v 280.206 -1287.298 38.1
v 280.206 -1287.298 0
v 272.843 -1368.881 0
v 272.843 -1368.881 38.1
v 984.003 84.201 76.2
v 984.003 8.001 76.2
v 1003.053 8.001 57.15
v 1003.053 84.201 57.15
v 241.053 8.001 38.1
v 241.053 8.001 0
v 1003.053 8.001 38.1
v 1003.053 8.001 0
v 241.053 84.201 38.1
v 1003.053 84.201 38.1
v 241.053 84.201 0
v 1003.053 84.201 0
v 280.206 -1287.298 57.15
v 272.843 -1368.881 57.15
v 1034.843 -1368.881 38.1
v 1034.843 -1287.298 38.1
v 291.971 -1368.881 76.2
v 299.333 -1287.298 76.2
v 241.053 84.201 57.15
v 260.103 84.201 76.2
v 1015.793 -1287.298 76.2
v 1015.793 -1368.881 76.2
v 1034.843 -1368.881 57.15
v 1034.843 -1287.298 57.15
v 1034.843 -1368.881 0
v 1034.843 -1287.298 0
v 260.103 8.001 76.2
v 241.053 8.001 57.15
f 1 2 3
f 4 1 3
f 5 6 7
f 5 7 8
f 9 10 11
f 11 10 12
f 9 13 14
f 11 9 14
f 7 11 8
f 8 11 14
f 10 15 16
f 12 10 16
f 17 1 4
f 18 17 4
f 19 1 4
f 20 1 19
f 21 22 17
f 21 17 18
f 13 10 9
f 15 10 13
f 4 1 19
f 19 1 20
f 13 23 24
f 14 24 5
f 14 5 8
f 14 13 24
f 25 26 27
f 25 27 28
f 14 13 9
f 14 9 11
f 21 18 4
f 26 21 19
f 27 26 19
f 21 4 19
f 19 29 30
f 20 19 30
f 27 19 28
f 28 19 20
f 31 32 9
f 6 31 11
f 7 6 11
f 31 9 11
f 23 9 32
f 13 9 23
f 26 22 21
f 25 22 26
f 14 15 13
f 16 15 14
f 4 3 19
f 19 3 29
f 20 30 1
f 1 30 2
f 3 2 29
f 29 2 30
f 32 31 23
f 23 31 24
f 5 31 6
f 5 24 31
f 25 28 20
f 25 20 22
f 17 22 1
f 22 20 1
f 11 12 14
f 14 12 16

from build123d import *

# Parameters (mm, degrees)
F0_W      = 762
F0_H      = 76.2
F2_DEPTH  = 38.1
F3_DEPTH  = 38.1
F4_W      = 762
F4_H      = 76.2
F5_DEPTH  = 38.1
F7_DEPTH  = 38.1
F8_SIZE   = 19.05
F8_2_SIZE = 19.05


with BuildPart() as f2:
    # F0 (on Top) → F2 (new body)
    with BuildSketch(Plane.XY):
        with Locations((622.052899, 46.100595)):
            Rectangle(F0_W, F0_H)
    extrude(amount=F2_DEPTH)


with BuildPart() as f3:
    # F1 (on Top) → F3 (new body)
    with BuildSketch(Plane.XY):
        Polygon((1034.843492, -1287.297841), (280.205927, -1287.297841), (272.843492, -1368.880719), (1034.843492, -1368.880719), align=None)
    extrude(amount=F3_DEPTH)


with BuildPart() as f5:
    # F4 (on face) → F5 (new body)
    with BuildSketch(Plane.XY.offset(38.1)):
        with Locations((622.052899, 46.100595)):
            Rectangle(F4_W, F4_H)
    extrude(amount=F5_DEPTH)

    # F8
    f8_edges = [f5.edges().sort_by_distance(p)[0] for p in [
        (241.052899, 46.100595, 76.2),
        (1003.052899, 46.100595, 76.2),
    ]]
    chamfer(f8_edges, length=F8_SIZE)


with BuildPart() as f7:
    # F6 (on face) → F7 (new body)
    with BuildSketch(Plane.XY.offset(38.1)):
        Polygon((1034.843492, -1287.297841), (280.205927, -1287.297841), (272.843492, -1368.880719), (1034.843492, -1368.880719), align=None)
    extrude(amount=F7_DEPTH)

    # F8#2
    f8_2_edges = [f7.edges().sort_by_distance(p)[0] for p in [
        (1034.843492, -1328.08928, 76.2),
        (276.52471, -1328.08928, 76.2),
    ]]
    chamfer(f8_2_edges, length=F8_2_SIZE)


solid = Compound([f2.part, f3.part, f5.part, f7.part])
